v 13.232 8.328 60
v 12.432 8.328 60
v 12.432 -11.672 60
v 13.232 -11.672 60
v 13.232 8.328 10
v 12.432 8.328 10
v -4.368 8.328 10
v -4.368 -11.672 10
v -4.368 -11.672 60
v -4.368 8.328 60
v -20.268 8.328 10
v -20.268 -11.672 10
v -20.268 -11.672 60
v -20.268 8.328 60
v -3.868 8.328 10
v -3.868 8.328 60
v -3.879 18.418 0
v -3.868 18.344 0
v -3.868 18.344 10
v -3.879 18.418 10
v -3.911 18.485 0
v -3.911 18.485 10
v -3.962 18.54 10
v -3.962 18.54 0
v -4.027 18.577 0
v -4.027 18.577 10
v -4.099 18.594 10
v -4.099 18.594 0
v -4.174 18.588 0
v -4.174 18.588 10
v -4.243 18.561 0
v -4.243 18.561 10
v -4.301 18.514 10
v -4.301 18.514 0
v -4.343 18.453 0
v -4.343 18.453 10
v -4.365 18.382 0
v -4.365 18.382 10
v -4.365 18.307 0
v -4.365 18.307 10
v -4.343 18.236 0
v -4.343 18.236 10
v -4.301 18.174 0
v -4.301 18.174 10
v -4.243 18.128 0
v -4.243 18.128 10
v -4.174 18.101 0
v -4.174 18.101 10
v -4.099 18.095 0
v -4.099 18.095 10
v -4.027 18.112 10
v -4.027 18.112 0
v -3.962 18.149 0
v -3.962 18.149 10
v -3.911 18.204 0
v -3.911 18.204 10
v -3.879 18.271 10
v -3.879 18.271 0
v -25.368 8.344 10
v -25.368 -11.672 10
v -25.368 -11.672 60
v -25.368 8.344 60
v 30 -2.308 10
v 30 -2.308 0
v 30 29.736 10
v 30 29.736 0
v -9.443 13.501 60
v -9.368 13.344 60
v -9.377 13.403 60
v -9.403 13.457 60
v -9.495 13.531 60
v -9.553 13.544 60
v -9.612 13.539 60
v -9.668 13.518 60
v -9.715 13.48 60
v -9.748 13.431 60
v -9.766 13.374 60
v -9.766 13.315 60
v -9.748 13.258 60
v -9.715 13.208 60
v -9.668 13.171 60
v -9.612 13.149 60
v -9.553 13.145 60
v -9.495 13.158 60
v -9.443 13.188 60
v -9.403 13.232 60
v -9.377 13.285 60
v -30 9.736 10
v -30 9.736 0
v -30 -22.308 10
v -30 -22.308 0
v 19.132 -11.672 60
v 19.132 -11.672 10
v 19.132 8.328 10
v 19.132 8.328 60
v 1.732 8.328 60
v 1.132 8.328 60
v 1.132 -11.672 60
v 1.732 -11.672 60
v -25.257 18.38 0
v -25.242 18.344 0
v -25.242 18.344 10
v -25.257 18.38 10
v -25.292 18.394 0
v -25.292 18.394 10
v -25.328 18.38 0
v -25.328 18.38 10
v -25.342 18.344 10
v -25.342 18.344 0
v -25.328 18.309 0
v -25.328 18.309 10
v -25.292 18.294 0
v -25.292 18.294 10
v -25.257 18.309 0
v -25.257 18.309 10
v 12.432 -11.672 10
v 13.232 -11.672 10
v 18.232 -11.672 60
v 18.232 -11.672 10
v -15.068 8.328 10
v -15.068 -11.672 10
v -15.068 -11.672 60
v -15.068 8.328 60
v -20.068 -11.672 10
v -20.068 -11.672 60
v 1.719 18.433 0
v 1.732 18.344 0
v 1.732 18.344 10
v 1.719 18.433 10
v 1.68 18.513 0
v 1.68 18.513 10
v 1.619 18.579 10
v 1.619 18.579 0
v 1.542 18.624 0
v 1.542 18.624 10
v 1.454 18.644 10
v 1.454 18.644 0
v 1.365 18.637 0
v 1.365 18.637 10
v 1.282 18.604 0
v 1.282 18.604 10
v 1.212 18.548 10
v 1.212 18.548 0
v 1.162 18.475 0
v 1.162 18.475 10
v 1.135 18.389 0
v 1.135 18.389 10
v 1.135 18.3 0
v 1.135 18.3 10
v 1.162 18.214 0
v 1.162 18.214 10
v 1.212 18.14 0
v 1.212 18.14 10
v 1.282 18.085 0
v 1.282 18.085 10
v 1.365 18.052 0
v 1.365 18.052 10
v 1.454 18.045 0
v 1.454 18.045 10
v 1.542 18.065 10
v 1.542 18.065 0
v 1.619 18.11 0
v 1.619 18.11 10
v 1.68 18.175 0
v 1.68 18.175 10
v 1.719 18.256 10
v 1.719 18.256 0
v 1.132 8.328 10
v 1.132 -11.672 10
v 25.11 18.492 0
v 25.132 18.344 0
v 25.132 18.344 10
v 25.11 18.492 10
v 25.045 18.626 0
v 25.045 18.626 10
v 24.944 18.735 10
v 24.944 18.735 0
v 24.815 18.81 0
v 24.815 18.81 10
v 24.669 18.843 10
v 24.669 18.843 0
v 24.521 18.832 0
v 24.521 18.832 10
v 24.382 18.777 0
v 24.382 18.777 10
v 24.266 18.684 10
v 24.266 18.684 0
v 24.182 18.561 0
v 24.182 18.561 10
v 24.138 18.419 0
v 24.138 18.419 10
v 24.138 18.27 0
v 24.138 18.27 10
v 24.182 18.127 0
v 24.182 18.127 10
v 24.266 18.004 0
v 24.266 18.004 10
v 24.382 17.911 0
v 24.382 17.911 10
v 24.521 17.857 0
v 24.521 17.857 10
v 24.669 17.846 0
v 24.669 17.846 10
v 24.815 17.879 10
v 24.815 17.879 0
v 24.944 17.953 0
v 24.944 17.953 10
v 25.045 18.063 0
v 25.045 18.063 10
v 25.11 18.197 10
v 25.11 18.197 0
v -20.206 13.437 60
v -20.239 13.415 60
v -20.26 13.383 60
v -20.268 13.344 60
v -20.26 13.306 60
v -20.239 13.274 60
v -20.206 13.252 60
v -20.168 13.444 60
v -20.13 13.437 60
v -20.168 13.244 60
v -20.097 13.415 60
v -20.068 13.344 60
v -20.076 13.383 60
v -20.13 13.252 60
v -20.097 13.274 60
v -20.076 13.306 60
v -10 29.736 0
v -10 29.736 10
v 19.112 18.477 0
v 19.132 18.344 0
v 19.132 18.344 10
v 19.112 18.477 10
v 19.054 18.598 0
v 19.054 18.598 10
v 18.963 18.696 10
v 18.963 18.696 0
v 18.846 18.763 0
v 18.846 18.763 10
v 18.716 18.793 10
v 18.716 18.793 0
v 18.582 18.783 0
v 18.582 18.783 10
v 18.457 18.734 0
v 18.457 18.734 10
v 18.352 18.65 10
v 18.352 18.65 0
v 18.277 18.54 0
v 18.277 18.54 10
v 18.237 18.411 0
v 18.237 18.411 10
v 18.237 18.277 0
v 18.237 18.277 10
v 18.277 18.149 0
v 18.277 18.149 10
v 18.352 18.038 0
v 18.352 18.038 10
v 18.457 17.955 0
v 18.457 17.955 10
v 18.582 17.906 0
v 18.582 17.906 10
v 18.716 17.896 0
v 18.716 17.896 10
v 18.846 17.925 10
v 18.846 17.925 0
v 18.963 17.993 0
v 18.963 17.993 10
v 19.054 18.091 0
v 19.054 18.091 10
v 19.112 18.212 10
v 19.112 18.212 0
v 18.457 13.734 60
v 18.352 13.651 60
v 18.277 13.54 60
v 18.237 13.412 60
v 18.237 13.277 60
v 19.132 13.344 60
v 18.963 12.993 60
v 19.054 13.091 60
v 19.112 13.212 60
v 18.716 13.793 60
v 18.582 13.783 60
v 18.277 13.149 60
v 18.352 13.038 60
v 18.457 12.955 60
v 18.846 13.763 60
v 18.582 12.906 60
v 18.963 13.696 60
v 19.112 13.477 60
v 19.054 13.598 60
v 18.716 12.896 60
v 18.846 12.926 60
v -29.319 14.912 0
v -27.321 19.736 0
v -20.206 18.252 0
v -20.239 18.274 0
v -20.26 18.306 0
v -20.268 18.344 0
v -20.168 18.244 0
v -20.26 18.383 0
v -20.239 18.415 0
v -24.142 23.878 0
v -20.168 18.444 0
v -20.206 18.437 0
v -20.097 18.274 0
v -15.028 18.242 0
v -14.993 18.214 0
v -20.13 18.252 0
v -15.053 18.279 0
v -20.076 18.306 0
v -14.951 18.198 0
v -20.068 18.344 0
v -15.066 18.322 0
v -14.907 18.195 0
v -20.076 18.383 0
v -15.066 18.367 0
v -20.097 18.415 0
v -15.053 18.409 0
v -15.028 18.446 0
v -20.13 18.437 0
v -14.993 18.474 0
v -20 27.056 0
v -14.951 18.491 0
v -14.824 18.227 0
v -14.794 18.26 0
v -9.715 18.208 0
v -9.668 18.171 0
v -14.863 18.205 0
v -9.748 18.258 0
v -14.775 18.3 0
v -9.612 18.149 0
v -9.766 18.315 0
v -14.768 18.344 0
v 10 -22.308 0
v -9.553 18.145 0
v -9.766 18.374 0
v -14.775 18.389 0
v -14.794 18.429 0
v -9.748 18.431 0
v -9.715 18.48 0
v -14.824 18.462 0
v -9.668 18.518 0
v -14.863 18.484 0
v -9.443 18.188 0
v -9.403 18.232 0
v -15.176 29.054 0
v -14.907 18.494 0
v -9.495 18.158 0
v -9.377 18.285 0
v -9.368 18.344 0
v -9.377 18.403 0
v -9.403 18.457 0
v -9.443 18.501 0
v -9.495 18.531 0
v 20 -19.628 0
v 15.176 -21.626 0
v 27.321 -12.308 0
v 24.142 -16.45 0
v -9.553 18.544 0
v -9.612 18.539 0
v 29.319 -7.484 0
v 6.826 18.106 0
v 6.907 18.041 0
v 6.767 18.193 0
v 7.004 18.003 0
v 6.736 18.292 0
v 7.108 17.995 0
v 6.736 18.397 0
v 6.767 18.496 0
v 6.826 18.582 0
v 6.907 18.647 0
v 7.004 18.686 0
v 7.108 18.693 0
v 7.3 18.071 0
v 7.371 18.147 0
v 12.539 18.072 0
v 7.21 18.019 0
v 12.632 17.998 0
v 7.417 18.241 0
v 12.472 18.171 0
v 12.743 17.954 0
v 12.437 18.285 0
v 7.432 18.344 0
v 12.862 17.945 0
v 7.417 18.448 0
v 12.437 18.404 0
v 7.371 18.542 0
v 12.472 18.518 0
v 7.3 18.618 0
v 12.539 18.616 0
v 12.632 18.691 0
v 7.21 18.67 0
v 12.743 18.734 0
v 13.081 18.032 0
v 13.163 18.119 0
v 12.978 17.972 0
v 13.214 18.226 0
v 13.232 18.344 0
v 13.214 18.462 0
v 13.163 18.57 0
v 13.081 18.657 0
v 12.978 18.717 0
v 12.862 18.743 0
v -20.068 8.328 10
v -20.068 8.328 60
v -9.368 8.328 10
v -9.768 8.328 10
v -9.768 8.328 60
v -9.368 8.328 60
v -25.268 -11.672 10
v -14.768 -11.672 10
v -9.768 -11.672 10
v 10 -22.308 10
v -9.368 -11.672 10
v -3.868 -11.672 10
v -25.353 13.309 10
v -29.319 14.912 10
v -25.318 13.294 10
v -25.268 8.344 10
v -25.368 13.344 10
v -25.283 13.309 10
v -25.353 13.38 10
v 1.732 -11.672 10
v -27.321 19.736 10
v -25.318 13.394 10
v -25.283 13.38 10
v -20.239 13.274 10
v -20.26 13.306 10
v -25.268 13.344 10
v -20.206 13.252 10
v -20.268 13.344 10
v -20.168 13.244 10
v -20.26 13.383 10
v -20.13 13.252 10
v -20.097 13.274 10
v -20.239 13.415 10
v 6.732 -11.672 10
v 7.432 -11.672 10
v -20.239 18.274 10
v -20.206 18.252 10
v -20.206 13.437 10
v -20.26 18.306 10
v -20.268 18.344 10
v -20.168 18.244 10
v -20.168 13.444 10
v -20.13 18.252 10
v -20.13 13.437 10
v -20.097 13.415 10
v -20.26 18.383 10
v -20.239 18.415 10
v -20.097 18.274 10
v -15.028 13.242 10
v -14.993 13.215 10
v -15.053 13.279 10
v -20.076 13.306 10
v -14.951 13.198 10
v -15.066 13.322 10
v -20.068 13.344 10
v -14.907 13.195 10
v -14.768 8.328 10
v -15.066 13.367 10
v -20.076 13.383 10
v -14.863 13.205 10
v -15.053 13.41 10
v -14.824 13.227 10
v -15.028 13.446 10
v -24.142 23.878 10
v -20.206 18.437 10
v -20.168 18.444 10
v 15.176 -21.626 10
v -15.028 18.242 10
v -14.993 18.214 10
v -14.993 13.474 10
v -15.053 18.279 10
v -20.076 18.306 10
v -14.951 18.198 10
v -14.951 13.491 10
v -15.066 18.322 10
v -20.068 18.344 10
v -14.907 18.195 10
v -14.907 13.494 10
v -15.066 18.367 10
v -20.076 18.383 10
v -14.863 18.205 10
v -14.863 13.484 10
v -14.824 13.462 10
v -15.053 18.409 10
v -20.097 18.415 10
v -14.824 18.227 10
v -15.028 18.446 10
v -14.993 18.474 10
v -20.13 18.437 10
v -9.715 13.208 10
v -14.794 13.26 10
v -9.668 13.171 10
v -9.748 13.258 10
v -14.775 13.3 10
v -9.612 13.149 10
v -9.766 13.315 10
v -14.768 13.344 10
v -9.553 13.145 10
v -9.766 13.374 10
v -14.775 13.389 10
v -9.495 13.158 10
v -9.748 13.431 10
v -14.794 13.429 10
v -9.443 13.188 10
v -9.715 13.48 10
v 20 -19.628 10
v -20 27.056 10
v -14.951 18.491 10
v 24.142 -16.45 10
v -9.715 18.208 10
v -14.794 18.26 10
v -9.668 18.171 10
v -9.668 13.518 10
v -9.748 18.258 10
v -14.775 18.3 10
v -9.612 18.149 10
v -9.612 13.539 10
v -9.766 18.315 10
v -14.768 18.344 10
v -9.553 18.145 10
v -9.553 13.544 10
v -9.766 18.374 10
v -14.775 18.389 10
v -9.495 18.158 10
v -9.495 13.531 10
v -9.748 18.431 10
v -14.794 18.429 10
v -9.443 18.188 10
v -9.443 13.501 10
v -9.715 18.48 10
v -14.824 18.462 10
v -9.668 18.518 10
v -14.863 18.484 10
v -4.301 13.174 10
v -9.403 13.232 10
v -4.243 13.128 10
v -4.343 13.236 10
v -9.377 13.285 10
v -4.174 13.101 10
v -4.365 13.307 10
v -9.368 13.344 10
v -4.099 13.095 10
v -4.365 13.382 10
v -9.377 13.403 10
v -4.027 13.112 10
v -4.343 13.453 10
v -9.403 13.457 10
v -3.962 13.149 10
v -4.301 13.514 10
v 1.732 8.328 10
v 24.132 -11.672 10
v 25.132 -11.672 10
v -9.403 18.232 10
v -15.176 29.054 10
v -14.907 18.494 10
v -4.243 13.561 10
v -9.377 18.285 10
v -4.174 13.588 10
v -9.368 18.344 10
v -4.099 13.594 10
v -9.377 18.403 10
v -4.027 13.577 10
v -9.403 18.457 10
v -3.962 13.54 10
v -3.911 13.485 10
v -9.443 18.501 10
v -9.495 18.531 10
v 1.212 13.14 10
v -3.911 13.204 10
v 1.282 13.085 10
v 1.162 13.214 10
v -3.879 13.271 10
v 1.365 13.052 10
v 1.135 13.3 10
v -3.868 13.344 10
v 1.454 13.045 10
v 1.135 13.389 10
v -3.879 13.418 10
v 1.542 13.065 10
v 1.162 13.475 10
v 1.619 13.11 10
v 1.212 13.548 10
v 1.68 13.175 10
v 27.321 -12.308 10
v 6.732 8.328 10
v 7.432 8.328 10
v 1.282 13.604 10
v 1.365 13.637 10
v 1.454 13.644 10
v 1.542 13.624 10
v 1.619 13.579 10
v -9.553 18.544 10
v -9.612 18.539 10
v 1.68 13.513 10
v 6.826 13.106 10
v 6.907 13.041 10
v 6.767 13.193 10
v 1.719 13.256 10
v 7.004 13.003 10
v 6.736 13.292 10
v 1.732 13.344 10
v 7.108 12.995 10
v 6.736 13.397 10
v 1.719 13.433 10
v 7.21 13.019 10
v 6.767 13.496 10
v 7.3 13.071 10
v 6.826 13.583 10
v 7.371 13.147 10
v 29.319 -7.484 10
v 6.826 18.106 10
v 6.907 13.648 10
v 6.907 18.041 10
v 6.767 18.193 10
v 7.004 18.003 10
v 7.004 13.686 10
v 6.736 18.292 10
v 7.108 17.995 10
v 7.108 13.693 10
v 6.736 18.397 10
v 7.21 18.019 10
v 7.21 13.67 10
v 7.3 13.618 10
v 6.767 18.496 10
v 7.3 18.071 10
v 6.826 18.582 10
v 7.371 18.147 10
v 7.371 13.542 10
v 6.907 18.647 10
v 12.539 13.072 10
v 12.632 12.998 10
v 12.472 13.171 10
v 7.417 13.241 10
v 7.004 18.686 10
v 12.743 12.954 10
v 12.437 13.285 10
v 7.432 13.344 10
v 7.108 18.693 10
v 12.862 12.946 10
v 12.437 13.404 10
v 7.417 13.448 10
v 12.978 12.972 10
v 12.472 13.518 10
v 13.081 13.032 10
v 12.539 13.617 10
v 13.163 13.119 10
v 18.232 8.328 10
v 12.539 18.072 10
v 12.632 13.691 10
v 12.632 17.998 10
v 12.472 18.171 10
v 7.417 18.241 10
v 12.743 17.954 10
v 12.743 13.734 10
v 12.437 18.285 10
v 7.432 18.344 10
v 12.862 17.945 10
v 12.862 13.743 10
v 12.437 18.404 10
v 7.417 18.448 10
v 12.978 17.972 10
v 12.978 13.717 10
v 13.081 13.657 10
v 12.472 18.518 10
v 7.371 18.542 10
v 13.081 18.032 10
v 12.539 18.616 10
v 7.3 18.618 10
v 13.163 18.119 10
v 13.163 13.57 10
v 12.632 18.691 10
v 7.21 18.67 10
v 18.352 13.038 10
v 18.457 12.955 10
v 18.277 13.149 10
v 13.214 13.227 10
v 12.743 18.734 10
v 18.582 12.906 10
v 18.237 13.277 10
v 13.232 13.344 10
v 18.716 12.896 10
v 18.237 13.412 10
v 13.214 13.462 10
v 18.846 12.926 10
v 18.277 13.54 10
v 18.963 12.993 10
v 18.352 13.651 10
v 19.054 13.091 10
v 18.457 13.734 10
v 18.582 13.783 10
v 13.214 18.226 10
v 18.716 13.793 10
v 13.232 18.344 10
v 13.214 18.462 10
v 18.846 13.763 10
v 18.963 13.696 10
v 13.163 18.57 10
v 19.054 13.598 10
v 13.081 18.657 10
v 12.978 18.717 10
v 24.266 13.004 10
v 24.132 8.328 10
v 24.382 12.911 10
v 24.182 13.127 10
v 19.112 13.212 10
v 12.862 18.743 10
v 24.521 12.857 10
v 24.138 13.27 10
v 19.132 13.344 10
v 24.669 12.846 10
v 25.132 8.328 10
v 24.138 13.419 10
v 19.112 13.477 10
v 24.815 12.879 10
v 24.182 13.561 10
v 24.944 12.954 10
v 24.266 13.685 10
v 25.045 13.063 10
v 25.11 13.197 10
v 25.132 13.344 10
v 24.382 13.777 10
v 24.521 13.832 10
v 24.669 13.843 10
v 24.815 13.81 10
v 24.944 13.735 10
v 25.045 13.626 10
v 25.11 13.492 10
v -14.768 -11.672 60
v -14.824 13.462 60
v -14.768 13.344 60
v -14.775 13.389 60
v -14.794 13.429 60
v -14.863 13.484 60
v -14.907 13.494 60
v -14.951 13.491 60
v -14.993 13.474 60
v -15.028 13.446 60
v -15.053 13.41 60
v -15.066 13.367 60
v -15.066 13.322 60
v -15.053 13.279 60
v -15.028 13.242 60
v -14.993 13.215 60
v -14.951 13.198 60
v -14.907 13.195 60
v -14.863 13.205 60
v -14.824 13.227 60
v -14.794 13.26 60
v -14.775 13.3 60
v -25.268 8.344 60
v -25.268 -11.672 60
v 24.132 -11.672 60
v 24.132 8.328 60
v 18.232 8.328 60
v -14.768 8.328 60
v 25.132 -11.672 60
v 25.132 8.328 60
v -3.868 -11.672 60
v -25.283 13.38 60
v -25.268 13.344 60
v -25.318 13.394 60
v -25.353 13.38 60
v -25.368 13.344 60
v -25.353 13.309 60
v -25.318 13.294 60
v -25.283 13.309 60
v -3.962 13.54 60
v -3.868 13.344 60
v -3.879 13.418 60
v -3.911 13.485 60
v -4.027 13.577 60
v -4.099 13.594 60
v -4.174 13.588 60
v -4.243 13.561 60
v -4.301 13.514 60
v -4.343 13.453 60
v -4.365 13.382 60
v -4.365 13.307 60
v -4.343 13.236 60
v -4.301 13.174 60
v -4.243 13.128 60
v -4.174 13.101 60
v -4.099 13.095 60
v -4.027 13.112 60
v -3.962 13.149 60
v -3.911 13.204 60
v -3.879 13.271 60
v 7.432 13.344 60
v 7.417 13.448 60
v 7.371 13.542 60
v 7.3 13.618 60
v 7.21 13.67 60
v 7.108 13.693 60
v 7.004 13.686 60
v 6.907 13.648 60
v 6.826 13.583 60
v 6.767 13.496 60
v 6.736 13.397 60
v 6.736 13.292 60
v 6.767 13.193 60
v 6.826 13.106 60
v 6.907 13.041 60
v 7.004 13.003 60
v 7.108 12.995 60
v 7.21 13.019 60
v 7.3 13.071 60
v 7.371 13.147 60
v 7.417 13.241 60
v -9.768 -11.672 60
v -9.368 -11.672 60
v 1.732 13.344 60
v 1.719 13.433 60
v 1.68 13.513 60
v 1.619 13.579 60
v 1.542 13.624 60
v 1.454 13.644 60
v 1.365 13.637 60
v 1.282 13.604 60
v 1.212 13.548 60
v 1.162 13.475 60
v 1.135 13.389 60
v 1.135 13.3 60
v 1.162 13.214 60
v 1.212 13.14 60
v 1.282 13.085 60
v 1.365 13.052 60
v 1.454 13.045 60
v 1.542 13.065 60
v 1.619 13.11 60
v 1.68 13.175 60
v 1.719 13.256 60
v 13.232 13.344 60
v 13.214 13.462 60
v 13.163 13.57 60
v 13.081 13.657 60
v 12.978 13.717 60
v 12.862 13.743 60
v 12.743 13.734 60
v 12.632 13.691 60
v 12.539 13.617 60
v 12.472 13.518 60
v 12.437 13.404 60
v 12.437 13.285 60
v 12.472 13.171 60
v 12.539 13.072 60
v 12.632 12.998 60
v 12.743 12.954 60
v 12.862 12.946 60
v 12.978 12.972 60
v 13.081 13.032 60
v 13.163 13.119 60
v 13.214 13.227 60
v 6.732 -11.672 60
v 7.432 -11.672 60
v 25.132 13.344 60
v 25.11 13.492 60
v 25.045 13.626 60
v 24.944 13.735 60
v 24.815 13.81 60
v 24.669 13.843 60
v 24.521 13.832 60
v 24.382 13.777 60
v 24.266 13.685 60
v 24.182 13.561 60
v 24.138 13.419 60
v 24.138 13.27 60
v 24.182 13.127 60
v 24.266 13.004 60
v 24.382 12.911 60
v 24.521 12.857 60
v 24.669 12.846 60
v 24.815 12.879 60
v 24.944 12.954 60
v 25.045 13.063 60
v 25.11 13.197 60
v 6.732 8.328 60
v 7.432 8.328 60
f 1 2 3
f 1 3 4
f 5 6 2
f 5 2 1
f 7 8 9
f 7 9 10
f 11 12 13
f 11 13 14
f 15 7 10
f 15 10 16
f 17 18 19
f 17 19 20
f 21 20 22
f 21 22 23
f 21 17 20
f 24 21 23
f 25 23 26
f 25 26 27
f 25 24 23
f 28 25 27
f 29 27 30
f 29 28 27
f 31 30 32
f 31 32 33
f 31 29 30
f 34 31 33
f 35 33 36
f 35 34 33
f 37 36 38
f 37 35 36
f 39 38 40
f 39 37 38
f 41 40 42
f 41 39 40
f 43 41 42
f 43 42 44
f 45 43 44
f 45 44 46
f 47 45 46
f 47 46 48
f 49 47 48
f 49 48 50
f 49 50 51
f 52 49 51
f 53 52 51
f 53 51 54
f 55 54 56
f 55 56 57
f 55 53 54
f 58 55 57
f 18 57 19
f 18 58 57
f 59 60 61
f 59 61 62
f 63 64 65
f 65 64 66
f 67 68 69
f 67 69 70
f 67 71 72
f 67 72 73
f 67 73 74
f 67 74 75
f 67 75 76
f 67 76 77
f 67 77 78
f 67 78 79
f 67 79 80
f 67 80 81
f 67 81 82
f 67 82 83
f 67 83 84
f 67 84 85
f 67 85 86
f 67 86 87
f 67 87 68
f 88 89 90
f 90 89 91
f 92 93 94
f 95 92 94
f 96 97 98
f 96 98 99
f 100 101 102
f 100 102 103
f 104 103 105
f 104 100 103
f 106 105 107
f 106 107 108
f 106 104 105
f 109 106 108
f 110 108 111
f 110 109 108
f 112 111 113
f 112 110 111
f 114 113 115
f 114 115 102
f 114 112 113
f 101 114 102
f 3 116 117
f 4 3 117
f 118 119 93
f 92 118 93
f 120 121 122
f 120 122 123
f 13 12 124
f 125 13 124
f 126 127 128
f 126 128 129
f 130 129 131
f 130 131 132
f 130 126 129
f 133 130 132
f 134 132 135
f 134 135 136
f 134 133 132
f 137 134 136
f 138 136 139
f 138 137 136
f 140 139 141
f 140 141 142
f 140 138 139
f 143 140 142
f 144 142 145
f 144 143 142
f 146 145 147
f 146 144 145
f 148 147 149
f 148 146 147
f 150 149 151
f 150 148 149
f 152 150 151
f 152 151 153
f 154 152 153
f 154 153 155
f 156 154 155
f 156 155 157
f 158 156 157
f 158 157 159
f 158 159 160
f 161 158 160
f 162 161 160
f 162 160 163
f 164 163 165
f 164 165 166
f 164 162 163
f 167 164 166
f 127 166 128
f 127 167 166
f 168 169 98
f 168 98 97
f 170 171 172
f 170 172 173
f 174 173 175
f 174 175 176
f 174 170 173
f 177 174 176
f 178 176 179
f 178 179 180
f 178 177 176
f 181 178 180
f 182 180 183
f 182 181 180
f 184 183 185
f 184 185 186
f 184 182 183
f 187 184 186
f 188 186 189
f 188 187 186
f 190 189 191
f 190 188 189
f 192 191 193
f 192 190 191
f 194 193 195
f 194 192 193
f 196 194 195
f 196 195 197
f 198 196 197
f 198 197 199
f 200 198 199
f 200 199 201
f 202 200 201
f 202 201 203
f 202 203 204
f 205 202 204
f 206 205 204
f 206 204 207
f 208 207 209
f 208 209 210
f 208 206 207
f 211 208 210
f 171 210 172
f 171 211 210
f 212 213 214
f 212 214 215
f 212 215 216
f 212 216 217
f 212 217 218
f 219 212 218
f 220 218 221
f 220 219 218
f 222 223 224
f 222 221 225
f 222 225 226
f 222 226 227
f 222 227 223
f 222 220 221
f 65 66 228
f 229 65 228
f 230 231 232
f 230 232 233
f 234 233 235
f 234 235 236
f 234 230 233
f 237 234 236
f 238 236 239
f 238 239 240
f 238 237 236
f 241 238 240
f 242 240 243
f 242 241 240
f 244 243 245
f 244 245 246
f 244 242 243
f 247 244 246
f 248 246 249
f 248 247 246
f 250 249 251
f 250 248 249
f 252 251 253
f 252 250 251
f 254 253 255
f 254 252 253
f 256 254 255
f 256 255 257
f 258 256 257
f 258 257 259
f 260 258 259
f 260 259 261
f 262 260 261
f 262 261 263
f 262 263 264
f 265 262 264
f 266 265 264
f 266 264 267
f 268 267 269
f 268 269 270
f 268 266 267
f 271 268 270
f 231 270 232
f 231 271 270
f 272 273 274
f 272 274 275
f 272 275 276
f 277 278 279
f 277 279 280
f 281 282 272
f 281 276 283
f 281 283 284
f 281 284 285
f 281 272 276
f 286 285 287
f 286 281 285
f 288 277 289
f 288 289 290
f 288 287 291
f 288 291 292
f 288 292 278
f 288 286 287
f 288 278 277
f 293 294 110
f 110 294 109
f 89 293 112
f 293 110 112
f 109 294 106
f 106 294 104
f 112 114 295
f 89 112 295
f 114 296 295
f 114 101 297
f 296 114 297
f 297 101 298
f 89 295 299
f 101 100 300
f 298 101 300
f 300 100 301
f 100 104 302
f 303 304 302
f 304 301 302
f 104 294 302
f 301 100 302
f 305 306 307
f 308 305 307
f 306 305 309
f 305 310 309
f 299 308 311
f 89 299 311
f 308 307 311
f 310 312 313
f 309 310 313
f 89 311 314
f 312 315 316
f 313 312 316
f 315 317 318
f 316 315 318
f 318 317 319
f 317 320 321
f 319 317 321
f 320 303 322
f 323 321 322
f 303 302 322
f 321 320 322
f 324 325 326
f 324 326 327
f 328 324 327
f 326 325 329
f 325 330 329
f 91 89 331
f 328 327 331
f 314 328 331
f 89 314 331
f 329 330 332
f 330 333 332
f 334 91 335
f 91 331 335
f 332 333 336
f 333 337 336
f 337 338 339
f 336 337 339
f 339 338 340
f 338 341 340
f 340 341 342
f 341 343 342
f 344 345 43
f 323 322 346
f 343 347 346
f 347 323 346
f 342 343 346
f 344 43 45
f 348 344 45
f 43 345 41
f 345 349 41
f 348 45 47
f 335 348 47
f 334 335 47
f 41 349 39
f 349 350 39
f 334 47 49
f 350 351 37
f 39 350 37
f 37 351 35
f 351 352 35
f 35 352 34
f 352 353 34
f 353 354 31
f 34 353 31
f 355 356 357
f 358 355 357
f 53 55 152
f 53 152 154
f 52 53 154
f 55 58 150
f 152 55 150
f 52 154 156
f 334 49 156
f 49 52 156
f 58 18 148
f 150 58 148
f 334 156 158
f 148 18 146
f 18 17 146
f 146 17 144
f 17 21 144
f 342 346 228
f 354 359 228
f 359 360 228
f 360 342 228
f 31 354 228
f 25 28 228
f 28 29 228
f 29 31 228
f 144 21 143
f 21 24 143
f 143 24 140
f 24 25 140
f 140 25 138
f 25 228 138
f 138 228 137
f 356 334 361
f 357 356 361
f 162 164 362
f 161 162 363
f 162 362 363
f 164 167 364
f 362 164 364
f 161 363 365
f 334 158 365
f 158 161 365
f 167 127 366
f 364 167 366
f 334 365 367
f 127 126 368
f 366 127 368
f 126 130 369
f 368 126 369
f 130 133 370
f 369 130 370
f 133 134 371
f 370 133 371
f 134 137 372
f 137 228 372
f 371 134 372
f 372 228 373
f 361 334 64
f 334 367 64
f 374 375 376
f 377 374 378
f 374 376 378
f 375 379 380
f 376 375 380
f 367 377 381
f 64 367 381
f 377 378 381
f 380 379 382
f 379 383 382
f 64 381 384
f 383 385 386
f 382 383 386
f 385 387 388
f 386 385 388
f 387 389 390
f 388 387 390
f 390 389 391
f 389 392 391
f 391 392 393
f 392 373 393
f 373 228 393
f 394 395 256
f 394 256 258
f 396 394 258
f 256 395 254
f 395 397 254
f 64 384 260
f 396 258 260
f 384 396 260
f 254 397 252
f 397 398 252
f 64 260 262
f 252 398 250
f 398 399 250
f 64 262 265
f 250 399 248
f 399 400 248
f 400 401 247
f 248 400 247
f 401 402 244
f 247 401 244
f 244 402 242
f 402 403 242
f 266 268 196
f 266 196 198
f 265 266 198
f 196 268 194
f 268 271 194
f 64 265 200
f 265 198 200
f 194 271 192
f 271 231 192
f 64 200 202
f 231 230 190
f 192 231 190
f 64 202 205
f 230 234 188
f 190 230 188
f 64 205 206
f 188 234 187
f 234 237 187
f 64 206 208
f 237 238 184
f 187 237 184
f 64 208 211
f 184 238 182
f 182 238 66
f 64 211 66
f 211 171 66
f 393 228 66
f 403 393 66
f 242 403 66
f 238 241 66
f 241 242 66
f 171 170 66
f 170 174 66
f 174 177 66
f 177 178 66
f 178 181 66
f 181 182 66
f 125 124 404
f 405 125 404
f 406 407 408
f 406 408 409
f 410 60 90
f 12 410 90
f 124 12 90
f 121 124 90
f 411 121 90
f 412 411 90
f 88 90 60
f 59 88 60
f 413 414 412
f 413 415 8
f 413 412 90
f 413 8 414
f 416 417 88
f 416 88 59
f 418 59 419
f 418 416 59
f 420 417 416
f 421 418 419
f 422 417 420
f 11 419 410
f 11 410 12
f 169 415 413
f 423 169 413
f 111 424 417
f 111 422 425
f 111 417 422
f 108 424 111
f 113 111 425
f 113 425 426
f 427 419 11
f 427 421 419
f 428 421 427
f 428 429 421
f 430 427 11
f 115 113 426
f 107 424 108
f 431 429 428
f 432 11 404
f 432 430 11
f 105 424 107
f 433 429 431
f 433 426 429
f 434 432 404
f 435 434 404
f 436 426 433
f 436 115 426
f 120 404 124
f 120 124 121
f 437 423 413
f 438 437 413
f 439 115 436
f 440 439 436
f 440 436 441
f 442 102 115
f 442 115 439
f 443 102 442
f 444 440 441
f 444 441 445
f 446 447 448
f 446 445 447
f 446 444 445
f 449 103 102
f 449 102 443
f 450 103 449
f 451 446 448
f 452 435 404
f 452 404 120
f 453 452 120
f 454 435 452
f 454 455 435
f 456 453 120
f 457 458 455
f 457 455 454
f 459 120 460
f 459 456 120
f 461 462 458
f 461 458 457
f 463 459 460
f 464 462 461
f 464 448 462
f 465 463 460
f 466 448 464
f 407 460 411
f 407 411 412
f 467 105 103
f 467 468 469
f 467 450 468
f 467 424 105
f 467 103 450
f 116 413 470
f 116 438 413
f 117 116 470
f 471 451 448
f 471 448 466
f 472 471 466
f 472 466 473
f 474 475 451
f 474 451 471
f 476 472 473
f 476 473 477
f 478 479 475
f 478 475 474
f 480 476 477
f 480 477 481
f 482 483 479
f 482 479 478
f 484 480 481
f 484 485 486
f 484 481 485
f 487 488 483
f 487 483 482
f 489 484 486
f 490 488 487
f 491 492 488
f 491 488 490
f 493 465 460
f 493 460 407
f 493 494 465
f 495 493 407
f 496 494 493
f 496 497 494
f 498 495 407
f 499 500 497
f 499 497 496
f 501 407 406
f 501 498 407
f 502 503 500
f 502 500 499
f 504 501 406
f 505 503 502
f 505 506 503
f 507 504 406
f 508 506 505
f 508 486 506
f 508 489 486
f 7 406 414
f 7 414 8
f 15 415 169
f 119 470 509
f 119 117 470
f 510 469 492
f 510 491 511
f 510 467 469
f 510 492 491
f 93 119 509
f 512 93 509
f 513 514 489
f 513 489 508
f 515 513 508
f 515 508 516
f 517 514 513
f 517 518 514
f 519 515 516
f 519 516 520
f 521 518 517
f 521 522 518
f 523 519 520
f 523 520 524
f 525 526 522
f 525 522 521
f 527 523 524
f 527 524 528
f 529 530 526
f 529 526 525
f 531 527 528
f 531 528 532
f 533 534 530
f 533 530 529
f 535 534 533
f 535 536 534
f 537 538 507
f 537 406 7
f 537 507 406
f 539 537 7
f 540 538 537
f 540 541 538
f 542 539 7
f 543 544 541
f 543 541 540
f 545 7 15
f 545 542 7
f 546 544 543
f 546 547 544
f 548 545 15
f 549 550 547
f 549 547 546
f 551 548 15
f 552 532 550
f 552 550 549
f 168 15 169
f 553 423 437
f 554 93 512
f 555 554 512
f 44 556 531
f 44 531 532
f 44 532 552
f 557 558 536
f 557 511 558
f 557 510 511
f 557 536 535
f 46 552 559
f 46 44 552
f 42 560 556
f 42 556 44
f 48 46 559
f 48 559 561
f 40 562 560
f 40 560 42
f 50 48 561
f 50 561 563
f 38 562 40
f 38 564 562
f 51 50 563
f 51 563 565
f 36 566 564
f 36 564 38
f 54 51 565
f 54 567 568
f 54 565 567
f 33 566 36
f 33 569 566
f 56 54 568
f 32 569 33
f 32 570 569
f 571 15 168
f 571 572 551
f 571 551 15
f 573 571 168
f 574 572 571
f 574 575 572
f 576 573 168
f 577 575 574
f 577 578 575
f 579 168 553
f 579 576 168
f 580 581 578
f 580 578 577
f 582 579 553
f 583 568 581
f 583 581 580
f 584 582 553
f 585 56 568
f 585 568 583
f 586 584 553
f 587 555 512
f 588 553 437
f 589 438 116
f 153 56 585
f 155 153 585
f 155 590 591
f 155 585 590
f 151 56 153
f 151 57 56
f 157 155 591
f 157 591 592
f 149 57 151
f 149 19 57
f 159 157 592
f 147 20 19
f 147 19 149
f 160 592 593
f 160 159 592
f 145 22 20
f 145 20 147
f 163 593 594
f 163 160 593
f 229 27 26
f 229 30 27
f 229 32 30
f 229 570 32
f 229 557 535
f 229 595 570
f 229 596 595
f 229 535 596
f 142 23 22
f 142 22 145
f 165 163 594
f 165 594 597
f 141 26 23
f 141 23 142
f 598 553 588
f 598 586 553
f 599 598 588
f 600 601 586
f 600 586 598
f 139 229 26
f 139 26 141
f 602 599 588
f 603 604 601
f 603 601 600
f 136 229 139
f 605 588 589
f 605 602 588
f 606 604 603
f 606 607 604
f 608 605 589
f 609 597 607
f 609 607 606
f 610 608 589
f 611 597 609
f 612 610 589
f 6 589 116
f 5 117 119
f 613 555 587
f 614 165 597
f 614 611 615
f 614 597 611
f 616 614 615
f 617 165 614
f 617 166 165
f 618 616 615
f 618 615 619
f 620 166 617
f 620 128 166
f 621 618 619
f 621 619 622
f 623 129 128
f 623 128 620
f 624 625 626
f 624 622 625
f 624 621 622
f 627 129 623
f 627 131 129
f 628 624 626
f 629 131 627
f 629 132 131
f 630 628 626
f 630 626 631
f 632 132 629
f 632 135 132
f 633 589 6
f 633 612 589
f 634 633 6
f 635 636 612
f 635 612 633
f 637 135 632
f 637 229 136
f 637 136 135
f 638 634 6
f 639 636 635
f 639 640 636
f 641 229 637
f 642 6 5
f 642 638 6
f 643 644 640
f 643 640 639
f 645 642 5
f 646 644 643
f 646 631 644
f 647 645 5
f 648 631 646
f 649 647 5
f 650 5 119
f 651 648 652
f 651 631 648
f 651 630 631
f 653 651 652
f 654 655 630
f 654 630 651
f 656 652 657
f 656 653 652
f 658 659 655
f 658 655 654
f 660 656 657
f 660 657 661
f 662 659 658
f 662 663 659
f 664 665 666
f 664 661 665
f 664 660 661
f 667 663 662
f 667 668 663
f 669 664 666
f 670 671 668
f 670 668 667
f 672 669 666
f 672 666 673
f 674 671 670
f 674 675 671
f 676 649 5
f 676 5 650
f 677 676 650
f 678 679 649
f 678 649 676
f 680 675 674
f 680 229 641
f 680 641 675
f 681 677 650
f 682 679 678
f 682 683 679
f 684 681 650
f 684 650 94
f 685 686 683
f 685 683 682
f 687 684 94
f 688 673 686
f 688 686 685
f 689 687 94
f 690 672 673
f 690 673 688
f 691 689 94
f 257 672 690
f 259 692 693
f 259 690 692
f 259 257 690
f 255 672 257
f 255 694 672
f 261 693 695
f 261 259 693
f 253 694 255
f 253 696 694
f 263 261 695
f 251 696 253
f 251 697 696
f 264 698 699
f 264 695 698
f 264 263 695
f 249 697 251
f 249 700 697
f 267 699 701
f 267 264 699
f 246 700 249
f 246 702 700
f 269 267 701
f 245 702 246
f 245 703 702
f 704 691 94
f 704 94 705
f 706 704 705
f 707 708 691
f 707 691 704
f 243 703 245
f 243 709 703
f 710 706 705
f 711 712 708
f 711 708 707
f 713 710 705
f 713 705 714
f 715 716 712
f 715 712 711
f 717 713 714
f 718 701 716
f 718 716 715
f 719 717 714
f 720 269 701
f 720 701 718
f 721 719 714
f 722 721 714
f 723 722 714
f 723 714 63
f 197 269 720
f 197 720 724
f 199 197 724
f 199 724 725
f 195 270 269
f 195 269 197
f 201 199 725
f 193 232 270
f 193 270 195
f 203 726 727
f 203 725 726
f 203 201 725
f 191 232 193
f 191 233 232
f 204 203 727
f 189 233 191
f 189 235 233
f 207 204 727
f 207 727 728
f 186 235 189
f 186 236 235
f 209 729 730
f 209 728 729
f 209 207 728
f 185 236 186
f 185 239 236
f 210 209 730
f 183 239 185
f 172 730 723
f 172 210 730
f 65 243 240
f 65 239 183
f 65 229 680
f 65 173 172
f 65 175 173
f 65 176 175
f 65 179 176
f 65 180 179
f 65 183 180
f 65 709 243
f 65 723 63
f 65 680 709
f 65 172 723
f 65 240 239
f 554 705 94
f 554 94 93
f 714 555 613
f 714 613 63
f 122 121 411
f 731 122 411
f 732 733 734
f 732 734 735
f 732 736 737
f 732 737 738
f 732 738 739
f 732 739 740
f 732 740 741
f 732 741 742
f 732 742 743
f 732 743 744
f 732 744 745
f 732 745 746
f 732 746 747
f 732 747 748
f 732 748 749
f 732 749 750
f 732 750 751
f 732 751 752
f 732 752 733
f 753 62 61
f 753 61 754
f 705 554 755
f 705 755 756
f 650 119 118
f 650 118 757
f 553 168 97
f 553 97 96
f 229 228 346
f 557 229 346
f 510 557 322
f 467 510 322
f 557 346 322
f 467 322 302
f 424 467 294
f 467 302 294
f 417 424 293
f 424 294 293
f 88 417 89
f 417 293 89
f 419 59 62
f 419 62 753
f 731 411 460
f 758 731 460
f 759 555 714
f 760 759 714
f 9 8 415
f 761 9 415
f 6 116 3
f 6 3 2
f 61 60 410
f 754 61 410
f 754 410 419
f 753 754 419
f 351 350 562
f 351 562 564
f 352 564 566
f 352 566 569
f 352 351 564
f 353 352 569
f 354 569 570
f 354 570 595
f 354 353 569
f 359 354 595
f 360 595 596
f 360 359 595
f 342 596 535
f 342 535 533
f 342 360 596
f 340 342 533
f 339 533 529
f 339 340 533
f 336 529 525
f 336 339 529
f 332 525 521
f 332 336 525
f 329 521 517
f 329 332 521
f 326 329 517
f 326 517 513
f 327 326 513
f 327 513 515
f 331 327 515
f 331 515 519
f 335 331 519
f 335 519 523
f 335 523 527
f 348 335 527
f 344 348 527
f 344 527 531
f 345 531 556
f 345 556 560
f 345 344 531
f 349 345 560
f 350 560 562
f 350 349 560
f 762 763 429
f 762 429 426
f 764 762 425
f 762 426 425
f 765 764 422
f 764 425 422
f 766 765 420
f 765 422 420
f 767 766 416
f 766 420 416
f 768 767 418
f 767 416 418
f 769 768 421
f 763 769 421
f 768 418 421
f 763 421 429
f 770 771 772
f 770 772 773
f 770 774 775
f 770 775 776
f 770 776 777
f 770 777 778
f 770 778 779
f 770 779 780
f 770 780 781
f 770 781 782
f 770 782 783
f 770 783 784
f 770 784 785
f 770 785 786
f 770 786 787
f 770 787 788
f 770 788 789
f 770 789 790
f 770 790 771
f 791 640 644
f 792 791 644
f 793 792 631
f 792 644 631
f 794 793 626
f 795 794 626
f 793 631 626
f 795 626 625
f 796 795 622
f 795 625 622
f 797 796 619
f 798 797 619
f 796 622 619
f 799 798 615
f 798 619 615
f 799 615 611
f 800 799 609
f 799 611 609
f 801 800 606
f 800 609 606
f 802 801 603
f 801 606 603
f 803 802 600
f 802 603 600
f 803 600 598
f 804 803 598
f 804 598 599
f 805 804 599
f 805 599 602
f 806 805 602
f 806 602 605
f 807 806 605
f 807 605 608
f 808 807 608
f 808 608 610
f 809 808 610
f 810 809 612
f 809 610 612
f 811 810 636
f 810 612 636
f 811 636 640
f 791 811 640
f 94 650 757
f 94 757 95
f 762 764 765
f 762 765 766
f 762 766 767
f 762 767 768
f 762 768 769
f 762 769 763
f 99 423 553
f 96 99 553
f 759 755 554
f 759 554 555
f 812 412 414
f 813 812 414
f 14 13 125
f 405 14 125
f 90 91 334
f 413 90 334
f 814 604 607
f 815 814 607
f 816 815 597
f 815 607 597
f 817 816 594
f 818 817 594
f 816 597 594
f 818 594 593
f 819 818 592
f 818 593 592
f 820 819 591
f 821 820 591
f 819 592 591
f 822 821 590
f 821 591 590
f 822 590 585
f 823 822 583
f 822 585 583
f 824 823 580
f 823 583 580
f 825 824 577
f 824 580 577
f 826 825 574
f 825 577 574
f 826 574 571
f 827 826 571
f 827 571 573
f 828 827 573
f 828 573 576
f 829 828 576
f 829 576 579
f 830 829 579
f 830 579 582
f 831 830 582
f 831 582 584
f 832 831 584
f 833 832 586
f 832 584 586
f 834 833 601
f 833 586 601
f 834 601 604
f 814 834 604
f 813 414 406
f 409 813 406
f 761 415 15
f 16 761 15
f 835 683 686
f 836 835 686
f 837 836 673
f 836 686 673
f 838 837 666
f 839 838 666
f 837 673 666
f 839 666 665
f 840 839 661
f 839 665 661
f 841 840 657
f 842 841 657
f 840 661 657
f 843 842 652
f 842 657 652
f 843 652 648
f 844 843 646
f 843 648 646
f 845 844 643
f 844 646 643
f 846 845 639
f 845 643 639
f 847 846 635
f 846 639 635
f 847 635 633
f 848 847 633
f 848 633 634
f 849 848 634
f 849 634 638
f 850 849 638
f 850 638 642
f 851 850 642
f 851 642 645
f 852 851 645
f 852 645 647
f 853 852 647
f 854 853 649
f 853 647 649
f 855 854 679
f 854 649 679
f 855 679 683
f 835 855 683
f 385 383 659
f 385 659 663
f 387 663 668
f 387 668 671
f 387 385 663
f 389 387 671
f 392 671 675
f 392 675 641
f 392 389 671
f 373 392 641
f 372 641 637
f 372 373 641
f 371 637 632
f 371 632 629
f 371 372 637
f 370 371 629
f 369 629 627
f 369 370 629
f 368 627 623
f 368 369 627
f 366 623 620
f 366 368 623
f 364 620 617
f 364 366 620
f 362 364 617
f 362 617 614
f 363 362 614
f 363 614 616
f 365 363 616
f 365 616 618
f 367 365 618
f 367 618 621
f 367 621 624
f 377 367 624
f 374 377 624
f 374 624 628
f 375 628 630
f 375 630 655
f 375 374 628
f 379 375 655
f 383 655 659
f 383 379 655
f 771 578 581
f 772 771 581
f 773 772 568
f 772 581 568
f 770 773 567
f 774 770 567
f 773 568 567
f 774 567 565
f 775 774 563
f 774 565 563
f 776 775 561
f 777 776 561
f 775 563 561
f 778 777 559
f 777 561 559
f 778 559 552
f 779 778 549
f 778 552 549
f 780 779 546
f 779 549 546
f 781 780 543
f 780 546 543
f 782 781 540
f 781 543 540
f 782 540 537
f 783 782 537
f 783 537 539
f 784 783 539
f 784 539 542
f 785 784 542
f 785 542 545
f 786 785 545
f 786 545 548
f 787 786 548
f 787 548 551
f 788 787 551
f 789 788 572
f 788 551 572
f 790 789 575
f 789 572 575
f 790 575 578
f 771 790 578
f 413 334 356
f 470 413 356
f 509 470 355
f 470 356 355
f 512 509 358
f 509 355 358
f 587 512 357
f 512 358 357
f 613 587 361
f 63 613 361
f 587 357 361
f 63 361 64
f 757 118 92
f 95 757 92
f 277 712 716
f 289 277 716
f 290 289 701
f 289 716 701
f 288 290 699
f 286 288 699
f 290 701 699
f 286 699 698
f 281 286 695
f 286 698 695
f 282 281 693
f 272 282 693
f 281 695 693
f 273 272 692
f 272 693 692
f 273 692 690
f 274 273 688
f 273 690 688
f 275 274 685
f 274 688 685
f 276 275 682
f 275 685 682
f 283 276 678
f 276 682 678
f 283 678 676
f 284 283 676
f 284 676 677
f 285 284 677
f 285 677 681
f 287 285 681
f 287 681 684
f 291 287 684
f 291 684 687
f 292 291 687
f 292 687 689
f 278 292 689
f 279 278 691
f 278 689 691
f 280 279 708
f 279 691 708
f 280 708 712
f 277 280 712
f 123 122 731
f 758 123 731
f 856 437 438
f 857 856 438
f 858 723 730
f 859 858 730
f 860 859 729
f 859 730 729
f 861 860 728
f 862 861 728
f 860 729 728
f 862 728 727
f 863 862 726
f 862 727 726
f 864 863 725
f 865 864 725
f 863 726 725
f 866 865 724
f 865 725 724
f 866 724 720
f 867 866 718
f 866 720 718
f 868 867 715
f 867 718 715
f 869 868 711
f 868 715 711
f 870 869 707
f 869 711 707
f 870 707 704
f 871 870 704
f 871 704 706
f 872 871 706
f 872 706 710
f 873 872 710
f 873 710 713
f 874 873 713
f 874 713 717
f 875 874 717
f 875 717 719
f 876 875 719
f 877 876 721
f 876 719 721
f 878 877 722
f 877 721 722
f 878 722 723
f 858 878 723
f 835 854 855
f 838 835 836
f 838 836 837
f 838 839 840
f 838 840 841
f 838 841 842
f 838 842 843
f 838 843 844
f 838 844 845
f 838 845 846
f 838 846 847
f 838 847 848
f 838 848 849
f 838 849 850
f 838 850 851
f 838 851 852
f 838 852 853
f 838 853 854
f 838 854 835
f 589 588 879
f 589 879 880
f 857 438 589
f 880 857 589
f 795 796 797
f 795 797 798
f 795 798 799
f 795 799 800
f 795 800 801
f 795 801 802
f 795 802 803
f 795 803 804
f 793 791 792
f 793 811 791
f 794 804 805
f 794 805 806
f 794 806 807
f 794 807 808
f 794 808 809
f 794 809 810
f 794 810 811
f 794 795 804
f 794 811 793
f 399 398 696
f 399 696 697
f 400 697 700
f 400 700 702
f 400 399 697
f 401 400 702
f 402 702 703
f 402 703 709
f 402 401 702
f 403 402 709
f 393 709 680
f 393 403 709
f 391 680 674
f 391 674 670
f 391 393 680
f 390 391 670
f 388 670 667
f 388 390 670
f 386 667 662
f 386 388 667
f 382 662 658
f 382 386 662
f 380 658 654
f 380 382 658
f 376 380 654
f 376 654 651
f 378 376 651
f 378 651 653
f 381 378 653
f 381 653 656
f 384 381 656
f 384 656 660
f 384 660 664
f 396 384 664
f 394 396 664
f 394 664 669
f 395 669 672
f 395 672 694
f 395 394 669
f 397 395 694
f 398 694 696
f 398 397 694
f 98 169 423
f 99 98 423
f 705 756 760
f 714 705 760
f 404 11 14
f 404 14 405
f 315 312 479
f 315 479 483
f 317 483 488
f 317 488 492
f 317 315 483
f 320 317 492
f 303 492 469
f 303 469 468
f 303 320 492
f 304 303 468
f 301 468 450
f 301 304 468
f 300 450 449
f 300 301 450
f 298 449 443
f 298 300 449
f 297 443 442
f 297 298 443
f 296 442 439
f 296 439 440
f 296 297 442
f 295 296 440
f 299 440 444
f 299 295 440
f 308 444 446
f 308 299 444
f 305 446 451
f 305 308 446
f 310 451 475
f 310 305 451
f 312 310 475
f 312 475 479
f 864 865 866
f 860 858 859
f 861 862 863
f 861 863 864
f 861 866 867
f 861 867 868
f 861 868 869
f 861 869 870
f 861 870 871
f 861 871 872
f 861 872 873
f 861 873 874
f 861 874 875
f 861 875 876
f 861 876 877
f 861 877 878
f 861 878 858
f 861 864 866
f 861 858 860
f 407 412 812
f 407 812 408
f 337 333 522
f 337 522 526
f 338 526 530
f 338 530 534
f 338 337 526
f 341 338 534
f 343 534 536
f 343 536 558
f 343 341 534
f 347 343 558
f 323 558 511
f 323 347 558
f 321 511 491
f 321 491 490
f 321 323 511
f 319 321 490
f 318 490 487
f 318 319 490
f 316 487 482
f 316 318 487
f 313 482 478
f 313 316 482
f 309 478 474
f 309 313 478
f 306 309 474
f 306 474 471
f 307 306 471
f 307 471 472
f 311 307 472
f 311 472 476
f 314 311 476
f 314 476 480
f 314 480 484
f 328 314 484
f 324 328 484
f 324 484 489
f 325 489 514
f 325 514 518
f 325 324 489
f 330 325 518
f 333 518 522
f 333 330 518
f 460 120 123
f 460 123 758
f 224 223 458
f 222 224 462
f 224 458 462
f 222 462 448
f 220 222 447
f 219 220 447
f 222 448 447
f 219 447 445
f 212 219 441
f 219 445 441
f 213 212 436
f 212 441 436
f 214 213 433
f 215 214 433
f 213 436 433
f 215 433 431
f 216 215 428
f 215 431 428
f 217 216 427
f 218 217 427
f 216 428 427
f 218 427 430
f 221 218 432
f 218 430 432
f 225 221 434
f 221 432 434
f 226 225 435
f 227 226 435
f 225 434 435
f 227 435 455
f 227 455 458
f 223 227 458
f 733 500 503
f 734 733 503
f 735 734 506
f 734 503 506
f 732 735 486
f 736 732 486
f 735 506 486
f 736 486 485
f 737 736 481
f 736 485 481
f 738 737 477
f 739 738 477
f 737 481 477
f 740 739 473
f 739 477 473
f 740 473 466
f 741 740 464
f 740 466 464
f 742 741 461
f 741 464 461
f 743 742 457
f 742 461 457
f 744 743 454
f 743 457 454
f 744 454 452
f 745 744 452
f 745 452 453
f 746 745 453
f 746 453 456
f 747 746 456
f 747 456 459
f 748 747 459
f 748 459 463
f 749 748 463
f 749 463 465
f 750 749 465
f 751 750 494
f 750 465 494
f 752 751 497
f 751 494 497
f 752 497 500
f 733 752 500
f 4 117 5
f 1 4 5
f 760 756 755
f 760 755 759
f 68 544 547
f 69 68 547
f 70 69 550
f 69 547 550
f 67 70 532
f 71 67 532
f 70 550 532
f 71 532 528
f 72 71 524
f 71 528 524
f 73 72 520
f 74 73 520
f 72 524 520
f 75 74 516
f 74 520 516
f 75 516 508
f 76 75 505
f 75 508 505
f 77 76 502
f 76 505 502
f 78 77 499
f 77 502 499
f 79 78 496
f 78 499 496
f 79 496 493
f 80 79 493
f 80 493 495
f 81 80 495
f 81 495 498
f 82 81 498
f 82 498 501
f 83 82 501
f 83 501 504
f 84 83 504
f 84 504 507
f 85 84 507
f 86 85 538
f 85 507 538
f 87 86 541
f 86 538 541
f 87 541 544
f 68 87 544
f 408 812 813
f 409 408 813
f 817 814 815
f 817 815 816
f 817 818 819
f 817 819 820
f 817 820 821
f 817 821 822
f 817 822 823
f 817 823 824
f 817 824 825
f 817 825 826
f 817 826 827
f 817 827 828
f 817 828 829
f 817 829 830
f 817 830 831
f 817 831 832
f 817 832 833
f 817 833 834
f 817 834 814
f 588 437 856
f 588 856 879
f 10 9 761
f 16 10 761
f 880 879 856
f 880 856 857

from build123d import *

# Parameters (mm, degrees)
F0_W     = 0.1
F0_H     = 20.0163984491
F0_W_2   = 0.2
F0_H_2   = 20
F0_W_3   = 0.3
F0_W_4   = 0.4
F0_W_5   = 0.5
F0_W_6   = 0.6
F0_W_7   = 0.7
F0_W_8   = 0.8
F0_W_9   = 0.9
F0_W_10  = 1
F0_R     = 0.05
F0_R_2   = 0.1
F0_R_3   = 0.15
F0_R_4   = 0.2
F0_R_5   = 0.25
F0_R_6   = 0.3
F0_R_7   = 0.35
F0_R_8   = 0.4
F0_R_9   = 0.45
F0_R_10  = 0.5
F1_DEPTH = 10
F2_W     = 1
F2_H     = 20
F2_W_2   = 0.2
F2_W_3   = 0.5
F2_W_4   = 0.9
F2_W_5   = 0.7
F2_W_6   = 0.8
F2_W_7   = 0.6
F2_R     = 0.35
F2_R_2   = 0.2
F2_R_3   = 0.15
F2_R_4   = 0.1
F2_W_8   = 0.3
F2_R_5   = 0.3
F2_R_6   = 0.4
F2_R_7   = 0.05
F2_R_8   = 0.45
F2_R_9   = 0.5
F2_R_10  = 0.25
F2_W_9   = 0.4
F2_W_10  = 0.1
F2_H_2   = 20.0163984491
F3_DEPTH = 50


with BuildPart() as f1:
    # F0 (on Top) → F1 (new body)
    with BuildSketch(Plane.XY):
        with BuildLine():
            Line((30, 29.7358127656), (-10, 29.7358127656))
            ThreePointArc((-10, 29.7358127656), (-24.1421356237, 23.8779483894), (-30, 9.7358127656))
            Line((-30, 9.7358127656), (-30, -22.3076807681))
            Line((-30, -22.3076807681), (10, -22.3076807681))
            ThreePointArc((10, -22.3076807681), (24.1421356237, -16.4498163918), (30, -2.3076807681))
            Line((30, -2.3076807681), (30, 29.7358127656))
        make_face()
        with Locations((-25.3179286689, -1.6637592667)):
            Rectangle(F0_W, F0_H, mode=Mode.SUBTRACT)
        with Locations((-20.1679286689, -1.6719584912)):
            Rectangle(F0_W_2, F0_H_2, mode=Mode.SUBTRACT)
        with Locations((-14.9179286689, -1.6719584912)):
            Rectangle(F0_W_3, F0_H_2, mode=Mode.SUBTRACT)
        with Locations((-9.5679286689, -1.6719584912)):
            Rectangle(F0_W_4, F0_H_2, mode=Mode.SUBTRACT)
        with Locations((-4.1179286689, -1.6719584912)):
            Rectangle(F0_W_5, F0_H_2, mode=Mode.SUBTRACT)
        with Locations((1.4320713311, -1.6719584912)):
            Rectangle(F0_W_6, F0_H_2, mode=Mode.SUBTRACT)
        with Locations((7.0820713311, -1.6719584912)):
            Rectangle(F0_W_7, F0_H_2, mode=Mode.SUBTRACT)
        with Locations((12.8320713311, -1.6719584912)):
            Rectangle(F0_W_8, F0_H_2, mode=Mode.SUBTRACT)
        with Locations((18.6820713311, -1.6719584912)):
            Rectangle(F0_W_9, F0_H_2, mode=Mode.SUBTRACT)
        with Locations((24.6320713311, -1.6719584912)):
            Rectangle(F0_W_10, F0_H_2, mode=Mode.SUBTRACT)
        with Locations((-25.3179286689, 13.3444399579)):
            Circle(F0_R, mode=Mode.SUBTRACT)
        with Locations((-20.1679286689, 13.3444399579)):
            Circle(F0_R_2, mode=Mode.SUBTRACT)
        with Locations((-14.9179286689, 13.3444399579)):
            Circle(F0_R_3, mode=Mode.SUBTRACT)
        with Locations((-9.5679286689, 13.3444399579)):
            Circle(F0_R_4, mode=Mode.SUBTRACT)
        with Locations((-4.1179286689, 13.3444399579)):
            Circle(F0_R_5, mode=Mode.SUBTRACT)
        with Locations((-25.2921710323, 18.3443736119)):
            Circle(F0_R, mode=Mode.SUBTRACT)
        with Locations((-20.1679286689, 18.3443736119)):
            Circle(F0_R_2, mode=Mode.SUBTRACT)
        with Locations((-14.9179286689, 18.3443736119)):
            Circle(F0_R_3, mode=Mode.SUBTRACT)
        with Locations((-9.5679286689, 18.3443736119)):
            Circle(F0_R_4, mode=Mode.SUBTRACT)
        with Locations((-4.1179286689, 18.3443736119)):
            Circle(F0_R_5, mode=Mode.SUBTRACT)
        with Locations((1.4320713311, 13.3444399579)):
            Circle(F0_R_6, mode=Mode.SUBTRACT)
        with Locations((7.0820713311, 13.3444399579)):
            Circle(F0_R_7, mode=Mode.SUBTRACT)
        with Locations((12.8320713311, 13.3444399579)):
            Circle(F0_R_8, mode=Mode.SUBTRACT)
        with Locations((18.6820713311, 13.3444399579)):
            Circle(F0_R_9, mode=Mode.SUBTRACT)
        with Locations((24.6320713311, 13.3444399579)):
            Circle(F0_R_10, mode=Mode.SUBTRACT)
        with Locations((1.4320713311, 18.3443736119)):
            Circle(F0_R_6, mode=Mode.SUBTRACT)
        with Locations((7.0820713311, 18.3443736119)):
            Circle(F0_R_7, mode=Mode.SUBTRACT)
        with Locations((12.8320713311, 18.3443736119)):
            Circle(F0_R_8, mode=Mode.SUBTRACT)
        with Locations((18.6820713311, 18.3443736119)):
            Circle(F0_R_9, mode=Mode.SUBTRACT)
        with Locations((24.6320713311, 18.3443736119)):
            Circle(F0_R_10, mode=Mode.SUBTRACT)
        with Locations((24.6320713311, -1.6719584912)):
            Rectangle(F0_W_10, F0_H_2)
        with Locations((18.6820713311, -1.6719584912)):
            Rectangle(F0_W_9, F0_H_2)
        with Locations((12.8320713311, -1.6719584912)):
            Rectangle(F0_W_8, F0_H_2)
        with Locations((7.0820713311, -1.6719584912)):
            Rectangle(F0_W_7, F0_H_2)
        with Locations((1.4320713311, -1.6719584912)):
            Rectangle(F0_W_6, F0_H_2)
        with Locations((-4.1179286689, -1.6719584912)):
            Rectangle(F0_W_5, F0_H_2)
        with Locations((-9.5679286689, -1.6719584912)):
            Rectangle(F0_W_4, F0_H_2)
        with Locations((-14.9179286689, -1.6719584912)):
            Rectangle(F0_W_3, F0_H_2)
        with Locations((-20.1679286689, -1.6719584912)):
            Rectangle(F0_W_2, F0_H_2)
        with Locations((-25.3179286689, -1.6637592667)):
            Rectangle(F0_W, F0_H)
        with Locations((24.6320713311, 13.3444399579)):
            Circle(F0_R_10)
        with Locations((18.6820713311, 13.3444399579)):
            Circle(F0_R_9)
        with Locations((12.8320713311, 13.3444399579)):
            Circle(F0_R_8)
        with Locations((7.0820713311, 13.3444399579)):
            Circle(F0_R_7)
        with Locations((1.4320713311, 13.3444399579)):
            Circle(F0_R_6)
        with Locations((-4.1179286689, 13.3444399579)):
            Circle(F0_R_5)
        with Locations((-9.5679286689, 13.3444399579)):
            Circle(F0_R_4)
        with Locations((-14.9179286689, 13.3444399579)):
            Circle(F0_R_3)
        with Locations((-20.1679286689, 13.3444399579)):
            Circle(F0_R_2)
        with Locations((-25.3179286689, 13.3444399579)):
            Circle(F0_R)
    extrude(amount=F1_DEPTH)

    # F2 (on face) → F3 (join)
    with BuildSketch(Plane.XY.offset(10)):
        with Locations((24.6320713311, -1.6719584912)):
            Rectangle(F2_W, F2_H)
        with Locations((-20.1679286689, -1.6719584912)):
            Rectangle(F2_W_2, F2_H)
        with Locations((-4.1179286689, -1.6719584912)):
            Rectangle(F2_W_3, F2_H)
        with Locations((18.6820713311, -1.6719584912)):
            Rectangle(F2_W_4, F2_H)
        with Locations((7.0820713311, -1.6719584912)):
            Rectangle(F2_W_5, F2_H)
        with Locations((12.8320713311, -1.6719584912)):
            Rectangle(F2_W_6, F2_H)
        with Locations((1.4320713311, -1.6719584912)):
            Rectangle(F2_W_7, F2_H)
        with Locations((7.0820713311, 13.3444399579)):
            Circle(F2_R)
        with Locations((-9.5679286689, 13.3444399579)):
            Circle(F2_R_2)
        with Locations((-14.9179286689, 13.3444399579)):
            Circle(F2_R_3)
        with Locations((-20.1679286689, 13.3444399579)):
            Circle(F2_R_4)
        with Locations((-14.9179286689, -1.6719584912)):
            Rectangle(F2_W_8, F2_H)
        with Locations((1.4320713311, 13.3444399579)):
            Circle(F2_R_5)
        with Locations((12.8320713311, 13.3444399579)):
            Circle(F2_R_6)
        with Locations((-25.3179286689, 13.3444399579)):
            Circle(F2_R_7)
        with Locations((18.6820713311, 13.3444399579)):
            Circle(F2_R_8)
        with Locations((24.6320713311, 13.3444399579)):
            Circle(F2_R_9)
        with Locations((-4.1179286689, 13.3444399579)):
            Circle(F2_R_10)
        with Locations((-9.5679286689, -1.6719584912)):
            Rectangle(F2_W_9, F2_H)
        with Locations((-25.3179286689, -1.6637592667)):
            Rectangle(F2_W_10, F2_H_2)
    extrude(amount=F3_DEPTH)


solid = f1.part
